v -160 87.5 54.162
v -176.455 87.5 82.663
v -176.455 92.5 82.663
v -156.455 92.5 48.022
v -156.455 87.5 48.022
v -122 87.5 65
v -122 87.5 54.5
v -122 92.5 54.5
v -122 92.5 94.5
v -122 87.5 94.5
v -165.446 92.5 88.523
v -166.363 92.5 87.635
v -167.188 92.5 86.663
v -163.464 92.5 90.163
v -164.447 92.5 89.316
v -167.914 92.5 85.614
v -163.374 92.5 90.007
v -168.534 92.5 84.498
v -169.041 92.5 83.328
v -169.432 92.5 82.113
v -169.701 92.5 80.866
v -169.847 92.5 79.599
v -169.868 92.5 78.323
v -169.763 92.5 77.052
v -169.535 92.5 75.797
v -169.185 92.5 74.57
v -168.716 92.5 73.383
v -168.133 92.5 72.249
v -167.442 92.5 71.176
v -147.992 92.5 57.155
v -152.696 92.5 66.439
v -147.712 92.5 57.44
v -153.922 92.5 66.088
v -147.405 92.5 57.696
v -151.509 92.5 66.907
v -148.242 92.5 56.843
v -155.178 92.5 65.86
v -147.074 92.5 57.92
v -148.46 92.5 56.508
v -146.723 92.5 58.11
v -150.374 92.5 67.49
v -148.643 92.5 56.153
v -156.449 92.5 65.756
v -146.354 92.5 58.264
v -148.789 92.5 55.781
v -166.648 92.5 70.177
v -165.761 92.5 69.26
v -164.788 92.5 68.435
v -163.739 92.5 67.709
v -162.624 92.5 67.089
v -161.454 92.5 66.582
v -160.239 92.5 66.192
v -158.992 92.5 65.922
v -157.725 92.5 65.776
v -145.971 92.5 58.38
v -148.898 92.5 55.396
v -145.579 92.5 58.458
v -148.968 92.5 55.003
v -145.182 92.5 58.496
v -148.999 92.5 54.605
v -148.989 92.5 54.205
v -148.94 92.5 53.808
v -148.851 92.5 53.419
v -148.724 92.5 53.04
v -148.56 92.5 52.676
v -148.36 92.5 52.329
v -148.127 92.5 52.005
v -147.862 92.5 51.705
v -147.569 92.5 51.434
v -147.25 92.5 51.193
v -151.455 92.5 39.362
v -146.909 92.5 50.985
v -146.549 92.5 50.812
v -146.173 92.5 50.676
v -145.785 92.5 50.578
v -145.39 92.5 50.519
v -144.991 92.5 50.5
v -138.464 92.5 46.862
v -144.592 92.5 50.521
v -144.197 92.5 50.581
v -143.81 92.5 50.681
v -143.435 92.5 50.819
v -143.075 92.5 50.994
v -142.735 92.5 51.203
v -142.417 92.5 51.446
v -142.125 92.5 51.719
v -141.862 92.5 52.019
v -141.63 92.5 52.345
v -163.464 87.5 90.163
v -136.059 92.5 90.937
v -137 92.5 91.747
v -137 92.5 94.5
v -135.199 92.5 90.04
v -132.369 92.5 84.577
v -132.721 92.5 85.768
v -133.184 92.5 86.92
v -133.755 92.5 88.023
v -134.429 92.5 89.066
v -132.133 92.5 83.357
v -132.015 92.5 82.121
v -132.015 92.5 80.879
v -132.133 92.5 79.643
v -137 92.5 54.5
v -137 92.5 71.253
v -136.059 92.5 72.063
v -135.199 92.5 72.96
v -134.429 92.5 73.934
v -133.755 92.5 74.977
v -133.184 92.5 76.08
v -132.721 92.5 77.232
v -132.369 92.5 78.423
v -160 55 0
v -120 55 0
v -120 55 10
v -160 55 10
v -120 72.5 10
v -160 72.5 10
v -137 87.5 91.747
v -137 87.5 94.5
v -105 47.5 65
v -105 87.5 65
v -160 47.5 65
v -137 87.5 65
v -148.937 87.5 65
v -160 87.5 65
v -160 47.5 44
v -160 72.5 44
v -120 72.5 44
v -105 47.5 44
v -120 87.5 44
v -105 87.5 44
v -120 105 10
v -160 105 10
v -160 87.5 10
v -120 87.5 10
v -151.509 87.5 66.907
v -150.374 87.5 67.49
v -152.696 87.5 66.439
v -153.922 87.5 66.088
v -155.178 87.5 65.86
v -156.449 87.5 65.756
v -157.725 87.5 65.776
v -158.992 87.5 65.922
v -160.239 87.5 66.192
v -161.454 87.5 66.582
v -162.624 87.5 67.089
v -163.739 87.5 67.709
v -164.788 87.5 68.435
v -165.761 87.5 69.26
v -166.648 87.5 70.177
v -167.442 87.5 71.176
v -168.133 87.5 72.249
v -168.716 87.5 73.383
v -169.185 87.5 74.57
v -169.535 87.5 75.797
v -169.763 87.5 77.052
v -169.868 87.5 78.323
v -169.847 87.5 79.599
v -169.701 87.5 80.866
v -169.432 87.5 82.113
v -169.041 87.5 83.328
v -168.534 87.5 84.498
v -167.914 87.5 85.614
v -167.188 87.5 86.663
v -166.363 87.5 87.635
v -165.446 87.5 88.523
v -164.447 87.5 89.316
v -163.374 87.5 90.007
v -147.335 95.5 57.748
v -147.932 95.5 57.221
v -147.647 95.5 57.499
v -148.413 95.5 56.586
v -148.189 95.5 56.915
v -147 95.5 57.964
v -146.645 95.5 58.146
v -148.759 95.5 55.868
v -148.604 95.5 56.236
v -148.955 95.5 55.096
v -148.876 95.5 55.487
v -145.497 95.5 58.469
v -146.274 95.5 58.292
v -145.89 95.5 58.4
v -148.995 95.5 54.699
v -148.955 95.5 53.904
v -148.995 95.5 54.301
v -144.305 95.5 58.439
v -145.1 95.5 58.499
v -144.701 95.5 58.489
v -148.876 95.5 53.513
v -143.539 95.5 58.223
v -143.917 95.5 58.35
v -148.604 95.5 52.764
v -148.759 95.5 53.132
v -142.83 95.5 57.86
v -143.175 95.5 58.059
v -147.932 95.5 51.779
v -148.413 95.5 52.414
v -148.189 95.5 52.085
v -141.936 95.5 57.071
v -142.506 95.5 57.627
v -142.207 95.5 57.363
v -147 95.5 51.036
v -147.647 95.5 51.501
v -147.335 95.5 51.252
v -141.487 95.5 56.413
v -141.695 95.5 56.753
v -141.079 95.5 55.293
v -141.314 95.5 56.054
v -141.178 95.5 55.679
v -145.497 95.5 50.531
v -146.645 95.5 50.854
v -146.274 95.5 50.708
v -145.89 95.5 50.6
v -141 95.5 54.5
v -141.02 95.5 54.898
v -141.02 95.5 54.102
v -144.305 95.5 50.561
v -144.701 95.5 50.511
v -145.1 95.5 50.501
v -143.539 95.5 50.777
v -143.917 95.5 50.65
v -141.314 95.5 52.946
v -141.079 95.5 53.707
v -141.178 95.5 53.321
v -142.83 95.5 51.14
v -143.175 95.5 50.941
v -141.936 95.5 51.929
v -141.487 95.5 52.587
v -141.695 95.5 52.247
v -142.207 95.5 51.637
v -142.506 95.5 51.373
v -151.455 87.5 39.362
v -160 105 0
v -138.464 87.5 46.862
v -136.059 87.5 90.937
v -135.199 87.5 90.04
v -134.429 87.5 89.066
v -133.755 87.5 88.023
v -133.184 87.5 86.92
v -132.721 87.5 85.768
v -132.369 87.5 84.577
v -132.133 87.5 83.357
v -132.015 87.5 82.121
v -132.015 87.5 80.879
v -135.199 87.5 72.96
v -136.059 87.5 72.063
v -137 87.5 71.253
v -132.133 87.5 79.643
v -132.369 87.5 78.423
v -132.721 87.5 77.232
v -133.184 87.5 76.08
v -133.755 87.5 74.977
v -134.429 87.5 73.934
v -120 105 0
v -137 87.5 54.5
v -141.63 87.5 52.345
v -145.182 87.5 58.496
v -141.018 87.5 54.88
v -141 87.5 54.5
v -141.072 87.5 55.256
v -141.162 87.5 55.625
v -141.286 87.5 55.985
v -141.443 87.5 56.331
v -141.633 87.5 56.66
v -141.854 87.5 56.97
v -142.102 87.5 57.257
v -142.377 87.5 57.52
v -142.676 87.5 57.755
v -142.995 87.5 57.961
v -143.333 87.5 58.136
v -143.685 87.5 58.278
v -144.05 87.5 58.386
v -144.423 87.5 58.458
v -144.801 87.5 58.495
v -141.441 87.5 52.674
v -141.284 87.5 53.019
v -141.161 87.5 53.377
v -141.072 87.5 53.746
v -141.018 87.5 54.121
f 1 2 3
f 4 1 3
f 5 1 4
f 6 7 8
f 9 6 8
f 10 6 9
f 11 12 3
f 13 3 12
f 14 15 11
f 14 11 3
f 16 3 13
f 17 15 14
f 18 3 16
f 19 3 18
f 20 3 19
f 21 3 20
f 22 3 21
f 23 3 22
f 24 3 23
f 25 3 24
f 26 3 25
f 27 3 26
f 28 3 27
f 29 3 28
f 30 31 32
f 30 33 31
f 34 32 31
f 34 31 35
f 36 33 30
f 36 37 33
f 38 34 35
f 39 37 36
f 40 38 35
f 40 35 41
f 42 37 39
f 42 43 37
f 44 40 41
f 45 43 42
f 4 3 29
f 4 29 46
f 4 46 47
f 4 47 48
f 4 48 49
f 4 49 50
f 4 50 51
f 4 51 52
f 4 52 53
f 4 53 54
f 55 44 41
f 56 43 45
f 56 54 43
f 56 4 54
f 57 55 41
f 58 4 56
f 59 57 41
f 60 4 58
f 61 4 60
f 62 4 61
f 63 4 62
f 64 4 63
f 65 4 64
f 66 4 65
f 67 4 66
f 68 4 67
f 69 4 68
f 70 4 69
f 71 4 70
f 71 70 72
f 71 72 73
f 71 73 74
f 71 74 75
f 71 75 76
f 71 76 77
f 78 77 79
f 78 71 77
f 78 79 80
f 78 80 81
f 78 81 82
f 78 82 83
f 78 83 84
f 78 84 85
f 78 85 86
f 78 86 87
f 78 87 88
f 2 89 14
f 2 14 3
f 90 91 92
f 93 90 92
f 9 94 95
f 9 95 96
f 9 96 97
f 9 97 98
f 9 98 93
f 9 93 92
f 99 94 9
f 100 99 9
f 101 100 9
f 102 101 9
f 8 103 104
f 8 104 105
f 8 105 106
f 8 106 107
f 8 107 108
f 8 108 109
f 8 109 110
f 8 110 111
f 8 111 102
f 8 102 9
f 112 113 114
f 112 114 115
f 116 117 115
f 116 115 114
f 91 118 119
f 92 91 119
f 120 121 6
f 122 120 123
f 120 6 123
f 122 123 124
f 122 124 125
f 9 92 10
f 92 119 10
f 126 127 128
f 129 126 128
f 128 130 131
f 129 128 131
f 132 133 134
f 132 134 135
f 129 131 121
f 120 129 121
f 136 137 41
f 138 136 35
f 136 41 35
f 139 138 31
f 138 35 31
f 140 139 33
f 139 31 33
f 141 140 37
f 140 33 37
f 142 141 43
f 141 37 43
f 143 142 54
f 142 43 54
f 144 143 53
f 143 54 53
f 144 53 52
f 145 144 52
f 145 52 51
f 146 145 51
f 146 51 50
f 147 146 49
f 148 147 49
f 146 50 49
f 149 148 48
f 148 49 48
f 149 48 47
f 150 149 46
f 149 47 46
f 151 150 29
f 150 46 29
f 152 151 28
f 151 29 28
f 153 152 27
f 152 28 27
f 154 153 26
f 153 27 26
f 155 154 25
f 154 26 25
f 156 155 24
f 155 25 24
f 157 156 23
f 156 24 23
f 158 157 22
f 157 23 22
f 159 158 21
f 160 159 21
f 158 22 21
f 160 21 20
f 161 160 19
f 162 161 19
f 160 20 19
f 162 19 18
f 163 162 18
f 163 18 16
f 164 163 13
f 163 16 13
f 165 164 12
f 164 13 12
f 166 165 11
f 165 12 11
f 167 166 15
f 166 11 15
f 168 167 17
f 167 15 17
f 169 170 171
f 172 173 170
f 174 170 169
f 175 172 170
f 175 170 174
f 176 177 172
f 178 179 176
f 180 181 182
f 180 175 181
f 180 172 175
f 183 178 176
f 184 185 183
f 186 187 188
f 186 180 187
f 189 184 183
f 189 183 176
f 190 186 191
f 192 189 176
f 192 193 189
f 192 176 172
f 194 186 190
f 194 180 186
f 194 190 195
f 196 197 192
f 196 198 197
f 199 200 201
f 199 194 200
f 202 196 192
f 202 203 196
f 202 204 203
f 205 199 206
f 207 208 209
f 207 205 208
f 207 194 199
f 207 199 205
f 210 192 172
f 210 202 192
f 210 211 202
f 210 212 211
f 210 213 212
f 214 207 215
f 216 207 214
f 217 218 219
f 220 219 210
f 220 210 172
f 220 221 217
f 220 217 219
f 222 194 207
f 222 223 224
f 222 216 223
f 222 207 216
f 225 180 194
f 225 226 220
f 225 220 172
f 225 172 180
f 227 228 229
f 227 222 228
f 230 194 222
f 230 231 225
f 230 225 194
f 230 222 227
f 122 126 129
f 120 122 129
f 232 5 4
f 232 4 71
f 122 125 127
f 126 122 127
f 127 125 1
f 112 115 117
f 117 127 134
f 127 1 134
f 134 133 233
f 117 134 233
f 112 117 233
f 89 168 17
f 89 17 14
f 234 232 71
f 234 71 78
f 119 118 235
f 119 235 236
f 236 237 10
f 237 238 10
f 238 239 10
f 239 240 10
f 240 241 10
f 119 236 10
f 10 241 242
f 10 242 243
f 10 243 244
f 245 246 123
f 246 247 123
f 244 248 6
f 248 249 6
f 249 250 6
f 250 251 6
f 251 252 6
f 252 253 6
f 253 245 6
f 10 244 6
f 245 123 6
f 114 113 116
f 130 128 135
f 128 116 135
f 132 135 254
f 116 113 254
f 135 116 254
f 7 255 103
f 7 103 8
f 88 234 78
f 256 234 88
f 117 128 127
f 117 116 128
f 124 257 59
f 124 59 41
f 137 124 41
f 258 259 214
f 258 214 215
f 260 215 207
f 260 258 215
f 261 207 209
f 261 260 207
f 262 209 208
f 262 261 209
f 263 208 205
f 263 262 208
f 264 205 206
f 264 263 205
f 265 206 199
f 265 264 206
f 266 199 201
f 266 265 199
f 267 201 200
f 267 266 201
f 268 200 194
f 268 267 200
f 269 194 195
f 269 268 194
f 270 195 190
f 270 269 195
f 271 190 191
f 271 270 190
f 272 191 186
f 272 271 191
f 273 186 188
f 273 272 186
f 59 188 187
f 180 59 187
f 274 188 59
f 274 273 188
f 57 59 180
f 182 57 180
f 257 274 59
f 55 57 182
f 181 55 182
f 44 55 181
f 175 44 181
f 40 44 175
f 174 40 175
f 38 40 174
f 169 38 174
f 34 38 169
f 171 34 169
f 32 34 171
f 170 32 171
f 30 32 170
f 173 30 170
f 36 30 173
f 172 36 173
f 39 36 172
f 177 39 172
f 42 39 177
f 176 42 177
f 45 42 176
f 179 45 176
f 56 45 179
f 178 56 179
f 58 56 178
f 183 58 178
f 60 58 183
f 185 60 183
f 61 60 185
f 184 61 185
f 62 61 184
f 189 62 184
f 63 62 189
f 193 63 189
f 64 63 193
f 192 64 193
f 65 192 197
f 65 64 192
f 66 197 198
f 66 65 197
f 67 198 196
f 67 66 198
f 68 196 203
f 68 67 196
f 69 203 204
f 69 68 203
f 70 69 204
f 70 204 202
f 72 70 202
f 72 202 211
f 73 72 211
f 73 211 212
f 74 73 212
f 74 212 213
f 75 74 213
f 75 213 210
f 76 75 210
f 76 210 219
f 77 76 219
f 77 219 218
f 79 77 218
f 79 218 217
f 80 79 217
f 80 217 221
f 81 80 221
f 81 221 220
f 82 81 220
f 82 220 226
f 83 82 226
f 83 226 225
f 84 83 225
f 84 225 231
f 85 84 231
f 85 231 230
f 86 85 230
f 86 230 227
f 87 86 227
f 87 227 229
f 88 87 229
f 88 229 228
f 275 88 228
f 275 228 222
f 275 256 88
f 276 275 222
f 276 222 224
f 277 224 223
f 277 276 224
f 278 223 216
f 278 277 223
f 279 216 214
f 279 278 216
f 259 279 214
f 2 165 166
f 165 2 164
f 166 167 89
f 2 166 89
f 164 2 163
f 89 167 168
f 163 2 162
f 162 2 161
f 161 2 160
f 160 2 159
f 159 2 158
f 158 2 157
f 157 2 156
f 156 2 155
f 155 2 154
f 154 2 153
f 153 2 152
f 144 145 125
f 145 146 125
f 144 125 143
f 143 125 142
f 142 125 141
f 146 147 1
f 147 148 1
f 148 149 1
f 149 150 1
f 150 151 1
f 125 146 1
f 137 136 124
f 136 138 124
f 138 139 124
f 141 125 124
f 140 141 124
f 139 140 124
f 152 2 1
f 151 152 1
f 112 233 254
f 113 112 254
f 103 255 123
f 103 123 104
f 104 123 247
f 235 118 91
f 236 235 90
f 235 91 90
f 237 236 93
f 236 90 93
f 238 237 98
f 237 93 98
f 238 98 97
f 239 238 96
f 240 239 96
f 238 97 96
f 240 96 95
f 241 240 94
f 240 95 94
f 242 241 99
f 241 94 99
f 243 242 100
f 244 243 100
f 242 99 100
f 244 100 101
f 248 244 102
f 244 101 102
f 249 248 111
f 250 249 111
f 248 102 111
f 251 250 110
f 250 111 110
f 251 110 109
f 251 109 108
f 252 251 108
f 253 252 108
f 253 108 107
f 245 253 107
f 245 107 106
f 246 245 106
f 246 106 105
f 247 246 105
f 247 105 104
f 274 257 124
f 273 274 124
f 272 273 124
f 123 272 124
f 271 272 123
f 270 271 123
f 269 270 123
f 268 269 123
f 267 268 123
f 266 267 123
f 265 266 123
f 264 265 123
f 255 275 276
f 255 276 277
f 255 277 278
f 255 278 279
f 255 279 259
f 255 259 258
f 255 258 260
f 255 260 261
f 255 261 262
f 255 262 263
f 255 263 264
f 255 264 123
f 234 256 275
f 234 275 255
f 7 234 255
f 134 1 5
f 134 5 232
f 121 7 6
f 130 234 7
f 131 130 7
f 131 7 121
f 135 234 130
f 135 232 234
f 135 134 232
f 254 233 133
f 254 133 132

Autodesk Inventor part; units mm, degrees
ref_plane "YZ Plane" through (0, 0, 0) normal (1, 0, 0) x (0, 1, 0)
ref_plane "XZ Plane" through (0, 0, 0) normal (0, 1, 0) x (-1, 0, 0)
ref_plane "Work Plane1" through (0, 0, 0) normal (0, 0, 1) x (1, 0, 0)
ref_plane "Work Plane2" through (-162, -84, 44) normal (0, 0, 1) x (1, 0, 0)
sketch "Sketch1" plane through (0, 0, 0) normal (0, 0, 1) x (1, 0, 0)
  line L0 (-280, 0) -> (-160, 0) projected
  line L1 (-280, 0) -> (-280, -40) projected
  line L2 (-162, -40) -> (-280, -40) projected
  line L3 (-118, -40) -> (-162, -40) projected
  line L4 (0, -40) -> (-118, -40) projected
  line L5 (0, 0) -> (0, -40) projected
  line L6 (-120, 0) -> (0, 0) projected
  line L7 (-120, 0) -> (-120, 160) projected
  line L8 (0, 160) -> (-120, 160) projected
  line L9 (0, 160) -> (0, 200) projected
  line L10 (-280, 200) -> (0, 200) projected
  line L11 (-280, 160) -> (-280, 200) projected
  line L12 (-160, 160) -> (-280, 160) projected
  line L13 (-160, 0) -> (-160, 160) projected
  line L14 (-160, 87.5) -> (-120, 87.5)
  line L15 (-120, 87.5) -> (-120, 72.5)
  line L16 (-120, 72.5) -> (-160, 72.5)
  line L17 (-160, 72.5) -> (-160, 87.5)
  line L18 (-160, 87.5) -> (-120, 72.5) construction
  line L19 (-120, 87.5) -> (-160, 72.5) construction
  point P0 (-140, 80)
  dimension "d0" = 40
  dimension "d1" = 15
extrude "Extrusion1" add sketch "Sketch1" along normal up to surface (44 mm away) contours L13 L14 L7 L16
ref_plane "Work Plane3" through (0, 0, 0) normal (0, 0, 1) x (1, 0, 0)
sketch "Sketch2" plane through (0, 0, 0) normal (0, 0, 1) x (1, 0, 0)
  line L0 (-120, 87.5) -> (-120, 72.5) projected
  line L1 (-160, 87.5) -> (-120, 87.5) projected
  line L2 (-160, 72.5) -> (-160, 87.5) projected
  line L3 (-120, 72.5) -> (-160, 72.5) projected
  line L4 (-160, 105) -> (-120, 105)
  line L5 (-120, 105) -> (-120, 55)
  line L6 (-120, 55) -> (-160, 55)
  line L7 (-160, 55) -> (-160, 105)
  line L8 (-160, 105) -> (-120, 55) construction
  line L9 (-120, 105) -> (-160, 55) construction
  point P0 (0, 0)
  point P1 (-140, 80)
  dimension "d7" = 40
  dimension "d8" = 50
extrude "Extrusion2" add sketch "Sketch2" along normal blind 10 contours L1 L7 L4 L5 | L5 L6 L7 L3
sketch "Sketch3" plane through (-160, 87.5, 44) normal (0, 1, 0) x (1, 0, 0)
  line L0 (0, 0) -> (55, 0)
  line L1 (55, 0) -> (55, -21)
  line L2 (55, -21) -> (0, -21)
  line L3 (0, -21) -> (0, 0)
  point P0 (160, 44)
  dimension "d11" = 55
  dimension "d12" = 21
extrude "Extrusion3" add sketch "Sketch3" against normal blind 40
sketch "Sketch4" plane through (-160, 87.5, 10) normal (0, 1, 0) x (1, 0, 0)
  line L0 (40, 0) -> (0, 0) projected
  line L1 (0, 0) -> (0, -55) projected
  line L2 (55, -55) -> (0, -55) projected
  line L3 (55, -34) -> (55, -55) projected
  line L4 (40, -34) -> (55, -34) projected
  line L5 (40, 0) -> (40, -34) projected
  line L6 (55, -55) -> (0, -55) projected
  line L7 (55, -34) -> (0, -34)
  line L8 (0, -34) -> (0, -55)
  line L9 (0, -55) -> (55, -55)
  line L10 (55, -55) -> (55, -34)
  line L11 (0, -44.5) -> (15, -44.5)
  line L12 (0, -44.5) -> (15, -44.5) construction
  circle A0 centre (15, -44.5) radius 4
  point P0 (160, 10)
  dimension "d15" = 15
  dimension "d16" = 0
  dimension "d17" = 8
extrude "Extrusion4" add sketch "Sketch4" along normal blind 8 contours A0
sketch "Sketch5" plane through (-160, 87.5, 10) normal (0, 1, 0) x (1, 0, 0)
  circle A0 centre (15, -44.5) radius 4 projected
  line L0 (40, 0) -> (0, 0) projected
  line L1 (0, 0) -> (0, -55) projected
  line L2 (55, -55) -> (0, -55) projected
  line L3 (55, -34) -> (55, -55) projected
  line L4 (40, -34) -> (55, -34) projected
  line L5 (40, 0) -> (40, -34) projected
  circle A1 centre (15, -44.5) radius 4 projected
  line L6 (15, -44.5) -> (28, -44.5)
  line L7 (15, -44.5) -> (28, -44.5) construction
  line L8 (15, -44.5) -> (2, -44.5)
  line L9 (15, -44.5) -> (28, -44.5) construction
  line L10 (28, -44.5) -> (38, -44.5)
  line L11 (38, -44.5) -> (38, -84.5)
  line L12 (38, -84.5) -> (28, -84.5)
  line L13 (28, -84.5) -> (28, -44.5)
  line L14 (28, -44.5) -> (23, -44.5)
  line L15 (23, -44.5) -> (23, -84.5)
  line L16 (23, -84.5) -> (28, -84.5)
  line L17 (28, -84.5) -> (28, -44.5)
  line L18 (3.5452, -38.0217) -> (16.5356, -45.5217)
  line L19 (16.5356, -45.5217) -> (-3.4644, -80.1628)
  line L20 (-3.4644, -80.1628) -> (-16.4548, -72.6628)
  line L21 (-16.4548, -72.6628) -> (3.5452, -38.0217)
  line L22 (3.5452, -38.0217) -> (8.5452, -29.3615)
  line L23 (8.5452, -29.3615) -> (21.5356, -36.8615)
  line L24 (21.5356, -36.8615) -> (16.5356, -45.5217)
  point P0 (160, 10)
  dimension "d20" = 13
  dimension "d21" = 0
  dimension "d22" = 13
  dimension "d23" = 180
  dimension "d24" = 10
  dimension "d25" = 40
  dimension "d26" = 5
  dimension "d27" = 15
  dimension "d28" = 40
  dimension "d31" = 10
extrude "Extrusion5" add sketch "Sketch5" along normal blind 5 contours L24 L6 L8 L18 A0 | A0 L18 L22 L23 L24 | L19 L2 L1 L21 L18 A0 | A0 L8 L18 L19 | L6 L13 L2 L15 | L24 L18 L8 L6 | L18 L8 A0 | L19 L20 L21 L1 L2 | L10 L11 L2 L13 | L2 L13 L16 L15 | L2 L11 L12 L13
sketch "Sketch6" plane through (-160, 92.5, 10) normal (0, 1, 0) x (1, 0, 0)
  line L0 (23, -84.5) -> (38, -84.5) projected
  line L1 (38, -84.5) -> (38, -44.5) projected
  line L2 (38, -44.5) -> (23, -44.5) projected
  line L3 (23, -44.5) -> (23, -84.5) projected
  arc A0 (18.3698, -42.3448) -> (14.8185, -48.4959) centre (15, -44.5) ccw projected
  line L4 (18.3698, -42.3448) -> (21.5356, -36.8615) projected
  line L5 (21.5356, -36.8615) -> (8.5452, -29.3615) projected
  line L6 (8.5452, -29.3615) -> (-16.4548, -72.6628) projected
  line L7 (-16.4548, -72.6628) -> (-3.4644, -80.1628) projected
  line L8 (-3.4644, -80.1628) -> (14.8185, -48.4959) projected
  circle A1 centre (15, -44.5) radius 4 projected
  line L9 (15, -44.5) -> (15, -71.5)
  circle A2 centre (15, -71.5) radius 13
  line L10 (15, -44.5) -> (3.1255, -68.7486)
  circle A3 centre (3.1255, -68.7486) radius 13
  point P0 (160, 10)
  dimension "d32" = 27
  dimension "d33" = 26
  dimension "d34" = 27
  dimension "d35" = 26
extrude "Extrusion6" cut sketch "Sketch6" against normal blind 5 contours A2 A3 L9 L3 | L3 A2 | A3 L8 A2 | A2 L8 A3 | L9 A3 A2 | A2 L10 L8 | L8 A3 L10 A2 | A2 L8 A3 | L10 A2 L8 | L10 A3 L8 A2
equation "\"d34\" = d32"
equation "\"d35\" = d33"
properties part number "BSF_ShuttleFeeder"
